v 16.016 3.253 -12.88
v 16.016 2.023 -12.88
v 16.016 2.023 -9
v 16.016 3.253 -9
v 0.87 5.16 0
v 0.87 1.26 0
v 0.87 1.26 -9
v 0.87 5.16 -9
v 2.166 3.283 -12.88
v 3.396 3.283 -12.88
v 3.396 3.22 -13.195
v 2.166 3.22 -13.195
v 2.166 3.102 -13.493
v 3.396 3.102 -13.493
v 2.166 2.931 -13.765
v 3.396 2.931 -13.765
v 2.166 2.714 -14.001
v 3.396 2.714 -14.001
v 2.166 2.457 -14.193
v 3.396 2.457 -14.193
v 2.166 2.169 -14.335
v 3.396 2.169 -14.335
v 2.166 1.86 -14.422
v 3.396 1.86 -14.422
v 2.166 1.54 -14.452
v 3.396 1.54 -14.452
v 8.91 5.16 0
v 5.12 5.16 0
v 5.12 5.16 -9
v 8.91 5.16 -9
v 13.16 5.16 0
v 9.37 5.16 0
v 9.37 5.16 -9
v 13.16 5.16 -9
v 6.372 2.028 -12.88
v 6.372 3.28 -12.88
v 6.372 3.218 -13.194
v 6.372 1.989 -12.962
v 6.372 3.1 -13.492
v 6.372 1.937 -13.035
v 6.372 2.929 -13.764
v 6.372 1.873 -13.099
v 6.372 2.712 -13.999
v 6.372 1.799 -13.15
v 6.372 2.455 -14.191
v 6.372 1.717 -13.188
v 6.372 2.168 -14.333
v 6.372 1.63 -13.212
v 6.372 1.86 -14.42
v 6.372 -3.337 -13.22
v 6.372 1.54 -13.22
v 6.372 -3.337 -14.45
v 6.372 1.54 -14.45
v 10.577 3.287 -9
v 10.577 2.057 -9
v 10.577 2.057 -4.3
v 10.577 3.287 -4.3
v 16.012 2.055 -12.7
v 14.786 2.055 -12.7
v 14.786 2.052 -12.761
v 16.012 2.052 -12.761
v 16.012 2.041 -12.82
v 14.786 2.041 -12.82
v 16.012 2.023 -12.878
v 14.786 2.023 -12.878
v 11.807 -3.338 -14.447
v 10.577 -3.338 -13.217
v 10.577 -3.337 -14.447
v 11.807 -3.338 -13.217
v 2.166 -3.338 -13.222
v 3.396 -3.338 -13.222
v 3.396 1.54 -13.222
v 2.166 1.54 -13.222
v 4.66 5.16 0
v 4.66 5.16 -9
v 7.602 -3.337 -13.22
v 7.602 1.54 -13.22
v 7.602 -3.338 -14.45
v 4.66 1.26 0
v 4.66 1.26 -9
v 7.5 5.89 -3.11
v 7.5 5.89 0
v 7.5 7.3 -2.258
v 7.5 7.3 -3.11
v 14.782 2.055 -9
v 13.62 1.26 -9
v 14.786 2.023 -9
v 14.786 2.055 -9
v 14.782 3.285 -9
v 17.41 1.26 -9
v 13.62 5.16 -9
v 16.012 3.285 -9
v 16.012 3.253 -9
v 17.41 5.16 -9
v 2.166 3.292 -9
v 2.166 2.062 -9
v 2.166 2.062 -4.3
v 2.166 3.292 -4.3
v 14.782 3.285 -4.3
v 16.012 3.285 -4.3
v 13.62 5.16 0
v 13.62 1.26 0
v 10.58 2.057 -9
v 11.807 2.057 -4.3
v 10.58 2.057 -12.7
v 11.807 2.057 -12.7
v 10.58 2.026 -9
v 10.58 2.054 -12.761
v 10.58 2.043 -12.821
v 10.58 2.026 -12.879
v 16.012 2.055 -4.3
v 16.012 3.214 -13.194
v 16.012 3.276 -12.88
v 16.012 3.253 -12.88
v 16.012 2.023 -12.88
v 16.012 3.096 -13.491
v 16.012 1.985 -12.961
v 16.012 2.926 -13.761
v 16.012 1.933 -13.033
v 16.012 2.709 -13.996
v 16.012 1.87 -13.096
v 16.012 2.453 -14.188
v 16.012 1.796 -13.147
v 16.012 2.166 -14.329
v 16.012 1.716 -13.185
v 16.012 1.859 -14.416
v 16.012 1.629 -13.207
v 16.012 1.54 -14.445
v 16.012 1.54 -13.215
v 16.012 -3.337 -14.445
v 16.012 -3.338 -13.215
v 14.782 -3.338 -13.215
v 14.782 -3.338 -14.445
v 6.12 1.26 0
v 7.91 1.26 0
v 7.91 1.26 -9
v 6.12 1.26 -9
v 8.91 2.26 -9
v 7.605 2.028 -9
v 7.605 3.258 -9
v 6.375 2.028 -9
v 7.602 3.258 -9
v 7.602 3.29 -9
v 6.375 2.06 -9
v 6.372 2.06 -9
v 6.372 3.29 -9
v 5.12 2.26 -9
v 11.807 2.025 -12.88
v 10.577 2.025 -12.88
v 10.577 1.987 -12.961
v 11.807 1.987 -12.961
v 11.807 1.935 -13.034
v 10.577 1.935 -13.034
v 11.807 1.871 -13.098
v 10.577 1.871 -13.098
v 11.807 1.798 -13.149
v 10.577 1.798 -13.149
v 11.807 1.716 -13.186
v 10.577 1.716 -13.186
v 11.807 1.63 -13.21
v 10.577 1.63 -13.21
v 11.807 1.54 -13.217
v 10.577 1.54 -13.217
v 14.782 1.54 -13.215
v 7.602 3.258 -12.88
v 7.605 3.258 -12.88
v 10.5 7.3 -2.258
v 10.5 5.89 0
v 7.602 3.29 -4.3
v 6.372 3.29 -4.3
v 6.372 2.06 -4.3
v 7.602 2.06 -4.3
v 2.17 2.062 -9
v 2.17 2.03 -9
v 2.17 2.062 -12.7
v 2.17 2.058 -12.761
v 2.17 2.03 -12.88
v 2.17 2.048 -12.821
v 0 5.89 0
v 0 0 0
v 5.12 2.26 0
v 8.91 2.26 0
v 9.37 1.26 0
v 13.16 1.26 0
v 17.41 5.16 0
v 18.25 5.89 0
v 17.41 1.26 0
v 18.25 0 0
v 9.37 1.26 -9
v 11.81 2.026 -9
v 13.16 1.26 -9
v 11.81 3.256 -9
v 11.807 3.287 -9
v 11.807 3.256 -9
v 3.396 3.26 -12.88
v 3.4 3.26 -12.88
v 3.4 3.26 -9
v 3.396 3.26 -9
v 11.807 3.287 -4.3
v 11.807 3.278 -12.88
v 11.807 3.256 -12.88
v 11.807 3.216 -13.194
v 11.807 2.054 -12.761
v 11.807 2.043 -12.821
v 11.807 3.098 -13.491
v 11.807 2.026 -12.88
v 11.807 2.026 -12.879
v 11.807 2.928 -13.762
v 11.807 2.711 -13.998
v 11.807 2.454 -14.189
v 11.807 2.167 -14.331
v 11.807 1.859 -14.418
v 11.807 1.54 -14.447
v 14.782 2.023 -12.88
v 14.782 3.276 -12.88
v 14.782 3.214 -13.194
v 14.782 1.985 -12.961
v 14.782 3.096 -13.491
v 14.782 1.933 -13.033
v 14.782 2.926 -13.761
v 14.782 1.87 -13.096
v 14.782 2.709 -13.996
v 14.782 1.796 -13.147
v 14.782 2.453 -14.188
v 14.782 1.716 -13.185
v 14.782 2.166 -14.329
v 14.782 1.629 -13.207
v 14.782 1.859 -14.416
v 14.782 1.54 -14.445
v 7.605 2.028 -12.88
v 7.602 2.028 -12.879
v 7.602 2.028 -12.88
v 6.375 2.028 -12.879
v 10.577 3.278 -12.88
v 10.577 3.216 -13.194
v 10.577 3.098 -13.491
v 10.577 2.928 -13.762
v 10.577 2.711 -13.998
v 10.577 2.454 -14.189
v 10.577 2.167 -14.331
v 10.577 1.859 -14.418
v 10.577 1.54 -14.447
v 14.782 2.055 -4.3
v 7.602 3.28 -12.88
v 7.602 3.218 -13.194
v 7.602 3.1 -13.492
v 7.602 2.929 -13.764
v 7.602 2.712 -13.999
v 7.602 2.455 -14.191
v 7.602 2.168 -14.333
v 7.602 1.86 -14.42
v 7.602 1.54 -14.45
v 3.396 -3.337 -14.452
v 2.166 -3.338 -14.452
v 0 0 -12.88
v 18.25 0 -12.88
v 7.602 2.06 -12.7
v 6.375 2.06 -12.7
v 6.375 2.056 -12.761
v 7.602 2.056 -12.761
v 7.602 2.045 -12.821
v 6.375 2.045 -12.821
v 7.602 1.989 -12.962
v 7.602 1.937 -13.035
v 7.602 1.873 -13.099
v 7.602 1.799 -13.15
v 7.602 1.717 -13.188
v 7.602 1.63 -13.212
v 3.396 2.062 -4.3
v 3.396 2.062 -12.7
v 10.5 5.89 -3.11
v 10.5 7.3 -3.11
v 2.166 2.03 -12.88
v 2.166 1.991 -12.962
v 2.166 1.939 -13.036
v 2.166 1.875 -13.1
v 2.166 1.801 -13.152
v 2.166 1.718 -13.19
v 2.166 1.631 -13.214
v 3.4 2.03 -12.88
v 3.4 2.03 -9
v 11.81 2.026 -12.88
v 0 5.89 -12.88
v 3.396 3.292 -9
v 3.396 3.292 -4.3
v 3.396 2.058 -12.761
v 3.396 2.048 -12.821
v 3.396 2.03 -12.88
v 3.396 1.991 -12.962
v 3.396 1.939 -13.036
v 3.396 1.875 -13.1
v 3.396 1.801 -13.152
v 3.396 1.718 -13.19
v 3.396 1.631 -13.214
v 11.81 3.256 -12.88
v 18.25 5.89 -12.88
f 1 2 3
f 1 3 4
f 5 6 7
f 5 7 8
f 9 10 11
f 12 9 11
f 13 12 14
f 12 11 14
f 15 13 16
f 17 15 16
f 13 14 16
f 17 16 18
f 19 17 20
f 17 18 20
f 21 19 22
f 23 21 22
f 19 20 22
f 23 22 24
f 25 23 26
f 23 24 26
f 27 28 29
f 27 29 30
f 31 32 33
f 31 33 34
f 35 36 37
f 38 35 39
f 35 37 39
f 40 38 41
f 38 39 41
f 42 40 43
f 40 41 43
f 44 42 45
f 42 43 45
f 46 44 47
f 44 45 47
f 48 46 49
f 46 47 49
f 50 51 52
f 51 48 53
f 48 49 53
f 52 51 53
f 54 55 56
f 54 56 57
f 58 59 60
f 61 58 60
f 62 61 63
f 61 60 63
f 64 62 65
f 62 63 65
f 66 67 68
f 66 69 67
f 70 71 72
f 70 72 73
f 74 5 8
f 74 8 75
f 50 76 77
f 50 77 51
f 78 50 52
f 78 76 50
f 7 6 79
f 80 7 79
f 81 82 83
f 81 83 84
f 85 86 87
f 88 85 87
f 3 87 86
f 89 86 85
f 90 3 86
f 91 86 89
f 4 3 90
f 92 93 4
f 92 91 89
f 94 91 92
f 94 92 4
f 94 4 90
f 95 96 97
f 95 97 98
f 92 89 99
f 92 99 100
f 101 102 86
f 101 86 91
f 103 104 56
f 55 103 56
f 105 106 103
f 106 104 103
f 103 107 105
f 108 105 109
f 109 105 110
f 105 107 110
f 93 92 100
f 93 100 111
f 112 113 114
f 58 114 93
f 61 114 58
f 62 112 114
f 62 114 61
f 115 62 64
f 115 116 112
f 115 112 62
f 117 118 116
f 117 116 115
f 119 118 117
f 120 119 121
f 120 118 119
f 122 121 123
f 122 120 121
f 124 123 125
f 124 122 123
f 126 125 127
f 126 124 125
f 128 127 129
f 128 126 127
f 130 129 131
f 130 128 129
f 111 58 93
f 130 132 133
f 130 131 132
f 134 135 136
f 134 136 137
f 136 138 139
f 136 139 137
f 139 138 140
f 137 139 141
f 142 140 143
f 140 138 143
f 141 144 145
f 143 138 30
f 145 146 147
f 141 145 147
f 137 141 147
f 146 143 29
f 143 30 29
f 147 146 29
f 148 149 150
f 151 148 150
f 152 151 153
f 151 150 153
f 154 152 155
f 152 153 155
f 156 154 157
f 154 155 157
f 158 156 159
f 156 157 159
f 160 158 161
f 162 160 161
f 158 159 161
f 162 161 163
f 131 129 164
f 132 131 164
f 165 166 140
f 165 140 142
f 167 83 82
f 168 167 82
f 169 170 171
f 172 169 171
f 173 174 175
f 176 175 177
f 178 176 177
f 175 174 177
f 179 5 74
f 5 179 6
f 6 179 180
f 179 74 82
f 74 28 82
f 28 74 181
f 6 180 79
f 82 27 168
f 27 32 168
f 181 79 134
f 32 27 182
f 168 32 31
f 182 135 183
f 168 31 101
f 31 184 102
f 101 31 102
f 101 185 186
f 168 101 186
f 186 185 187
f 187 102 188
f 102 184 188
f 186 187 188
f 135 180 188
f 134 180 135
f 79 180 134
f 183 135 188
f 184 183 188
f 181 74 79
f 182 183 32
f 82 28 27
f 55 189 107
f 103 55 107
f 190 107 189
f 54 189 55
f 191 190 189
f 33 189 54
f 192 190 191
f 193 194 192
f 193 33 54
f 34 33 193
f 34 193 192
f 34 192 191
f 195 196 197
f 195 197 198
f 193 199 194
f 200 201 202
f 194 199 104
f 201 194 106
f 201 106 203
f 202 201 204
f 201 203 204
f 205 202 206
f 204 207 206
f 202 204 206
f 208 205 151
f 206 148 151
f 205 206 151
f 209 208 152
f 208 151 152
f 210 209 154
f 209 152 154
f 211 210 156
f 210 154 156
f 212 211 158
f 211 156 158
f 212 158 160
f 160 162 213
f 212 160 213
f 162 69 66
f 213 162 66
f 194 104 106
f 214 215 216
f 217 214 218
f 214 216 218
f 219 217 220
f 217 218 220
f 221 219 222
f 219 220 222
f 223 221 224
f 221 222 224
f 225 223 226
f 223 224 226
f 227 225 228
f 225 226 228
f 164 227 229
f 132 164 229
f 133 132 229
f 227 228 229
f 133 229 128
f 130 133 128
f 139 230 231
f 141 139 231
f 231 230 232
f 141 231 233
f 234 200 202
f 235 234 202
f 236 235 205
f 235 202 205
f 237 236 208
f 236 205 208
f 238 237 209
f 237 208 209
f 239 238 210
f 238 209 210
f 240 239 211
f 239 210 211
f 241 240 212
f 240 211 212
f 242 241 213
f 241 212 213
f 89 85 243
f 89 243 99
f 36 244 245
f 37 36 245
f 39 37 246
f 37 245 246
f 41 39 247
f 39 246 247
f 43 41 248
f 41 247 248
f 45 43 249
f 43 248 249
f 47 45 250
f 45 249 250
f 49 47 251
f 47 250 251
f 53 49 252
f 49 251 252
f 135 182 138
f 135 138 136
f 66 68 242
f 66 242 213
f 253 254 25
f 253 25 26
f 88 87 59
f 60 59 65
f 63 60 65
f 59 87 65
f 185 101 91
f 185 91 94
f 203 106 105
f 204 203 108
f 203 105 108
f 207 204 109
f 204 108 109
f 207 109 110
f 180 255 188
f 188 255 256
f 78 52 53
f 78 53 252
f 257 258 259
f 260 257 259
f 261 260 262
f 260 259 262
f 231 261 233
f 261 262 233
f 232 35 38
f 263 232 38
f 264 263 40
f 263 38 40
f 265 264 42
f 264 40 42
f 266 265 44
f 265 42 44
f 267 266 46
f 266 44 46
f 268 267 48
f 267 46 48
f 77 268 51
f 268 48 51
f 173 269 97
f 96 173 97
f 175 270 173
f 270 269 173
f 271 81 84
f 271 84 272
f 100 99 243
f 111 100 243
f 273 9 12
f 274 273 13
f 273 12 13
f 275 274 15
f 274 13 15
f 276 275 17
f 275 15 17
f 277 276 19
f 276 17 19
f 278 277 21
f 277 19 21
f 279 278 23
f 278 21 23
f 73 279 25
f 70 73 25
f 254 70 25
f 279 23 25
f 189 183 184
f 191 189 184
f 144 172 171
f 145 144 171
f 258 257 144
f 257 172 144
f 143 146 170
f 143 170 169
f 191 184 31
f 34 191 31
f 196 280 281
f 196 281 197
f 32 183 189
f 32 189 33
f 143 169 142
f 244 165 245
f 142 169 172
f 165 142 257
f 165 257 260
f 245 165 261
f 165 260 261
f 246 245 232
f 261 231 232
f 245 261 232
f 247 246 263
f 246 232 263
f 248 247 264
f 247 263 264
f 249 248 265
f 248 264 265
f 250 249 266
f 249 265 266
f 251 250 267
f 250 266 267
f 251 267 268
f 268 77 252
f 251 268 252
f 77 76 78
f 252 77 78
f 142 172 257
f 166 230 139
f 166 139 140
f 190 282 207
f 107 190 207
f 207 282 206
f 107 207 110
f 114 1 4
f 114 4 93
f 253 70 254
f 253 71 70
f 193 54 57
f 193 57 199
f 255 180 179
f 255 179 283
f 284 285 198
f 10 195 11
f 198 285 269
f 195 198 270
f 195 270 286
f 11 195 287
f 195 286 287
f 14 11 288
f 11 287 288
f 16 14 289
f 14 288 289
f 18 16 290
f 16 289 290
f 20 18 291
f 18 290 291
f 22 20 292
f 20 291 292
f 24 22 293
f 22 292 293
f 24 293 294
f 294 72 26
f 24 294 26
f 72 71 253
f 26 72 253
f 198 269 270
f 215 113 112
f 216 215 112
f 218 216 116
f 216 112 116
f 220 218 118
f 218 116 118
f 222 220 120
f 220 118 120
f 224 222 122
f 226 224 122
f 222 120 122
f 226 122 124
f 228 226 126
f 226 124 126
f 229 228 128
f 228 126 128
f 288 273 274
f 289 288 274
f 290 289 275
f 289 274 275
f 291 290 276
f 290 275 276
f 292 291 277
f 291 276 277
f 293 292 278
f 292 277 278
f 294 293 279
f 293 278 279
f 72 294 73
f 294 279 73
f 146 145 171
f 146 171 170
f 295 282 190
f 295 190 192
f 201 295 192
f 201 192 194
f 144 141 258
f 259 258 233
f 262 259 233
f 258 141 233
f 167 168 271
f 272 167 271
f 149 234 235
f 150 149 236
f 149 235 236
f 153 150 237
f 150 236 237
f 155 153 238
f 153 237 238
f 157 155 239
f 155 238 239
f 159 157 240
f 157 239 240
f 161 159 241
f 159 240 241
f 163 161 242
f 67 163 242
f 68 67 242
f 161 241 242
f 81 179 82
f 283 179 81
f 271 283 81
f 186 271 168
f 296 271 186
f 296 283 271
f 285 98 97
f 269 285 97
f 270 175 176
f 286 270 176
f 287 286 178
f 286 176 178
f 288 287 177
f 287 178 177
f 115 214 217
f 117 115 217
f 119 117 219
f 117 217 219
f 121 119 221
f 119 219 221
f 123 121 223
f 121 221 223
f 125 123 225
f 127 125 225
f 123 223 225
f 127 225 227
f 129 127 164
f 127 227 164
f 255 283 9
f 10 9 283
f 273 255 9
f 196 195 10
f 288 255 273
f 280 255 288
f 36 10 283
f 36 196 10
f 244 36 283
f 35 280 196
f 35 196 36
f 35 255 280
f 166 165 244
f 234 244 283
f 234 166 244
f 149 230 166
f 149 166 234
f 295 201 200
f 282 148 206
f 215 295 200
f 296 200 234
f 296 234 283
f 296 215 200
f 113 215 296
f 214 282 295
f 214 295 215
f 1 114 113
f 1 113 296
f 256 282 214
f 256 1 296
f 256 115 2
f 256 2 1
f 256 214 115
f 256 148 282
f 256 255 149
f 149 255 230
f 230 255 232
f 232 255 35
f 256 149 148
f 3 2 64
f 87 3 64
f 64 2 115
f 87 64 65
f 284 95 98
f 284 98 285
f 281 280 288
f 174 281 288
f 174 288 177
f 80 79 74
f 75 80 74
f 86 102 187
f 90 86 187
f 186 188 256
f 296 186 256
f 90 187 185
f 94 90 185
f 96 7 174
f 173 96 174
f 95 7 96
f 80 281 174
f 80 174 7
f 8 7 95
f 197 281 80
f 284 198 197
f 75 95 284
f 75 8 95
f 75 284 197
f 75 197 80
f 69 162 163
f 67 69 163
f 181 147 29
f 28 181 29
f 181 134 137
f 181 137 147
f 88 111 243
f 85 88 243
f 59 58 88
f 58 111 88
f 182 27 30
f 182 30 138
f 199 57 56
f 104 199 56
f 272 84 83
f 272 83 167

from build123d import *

# Parameters (mm, degrees)
SKETCH1_W           = 18.25
SKETCH1_H           = 12.88
BOSS_EXTRUDE1_DEPTH = 5.89
SKETCH2_W           = 3.79
SKETCH2_H           = 3.9
CUT_EXTRUDE1_DEPTH  = 9
SKETCH3_W           = 3
SKETCH3_H           = 3.11
BOSS_EXTRUDE2_DEPTH = 1.41
CUT_EXTRUDE2_DEPTH  = 3
SKETCH5_W           = 1.23
SKETCH5_H           = 1.23
CUT_EXTRUDE3_DEPTH  = 4
SKETCH8_W           = 1.23
SKETCH8_H           = 1.23


with BuildPart() as part:
    # Sketch1 → Boss-Extrude1 (new body)
    with BuildSketch(Plane(origin=(0, 0, 0), x_dir=(1, 0, 0), z_dir=(0, 1, 0))):
        with Locations((9.125, 6.44)):
            Rectangle(SKETCH1_W, SKETCH1_H)
    extrude(amount=BOSS_EXTRUDE1_DEPTH)

    # Sketch2 → Cut-Extrude1 (cut)
    with BuildSketch(Plane.XY):
        with Locations((2.765, 3.21048567)):
            Rectangle(SKETCH2_W, SKETCH2_H)
        Polygon((5.12, 5.16048567), (8.91, 5.16048567), (8.91, 2.26048567), (7.91, 1.26048567), (6.12, 1.26048567), (5.12, 2.26048567), align=None)
        with Locations((11.265, 3.21048567)):
            Rectangle(SKETCH2_W, SKETCH2_H)
        with Locations((15.515, 3.21048567)):
            Rectangle(SKETCH2_W, SKETCH2_H)
    extrude(amount=-CUT_EXTRUDE1_DEPTH, mode=Mode.SUBTRACT)

    # Sketch3 → Boss-Extrude2 (add)
    with BuildSketch(Plane(origin=(0, 5.89, 0), x_dir=(1, 0, 0), z_dir=(0, 1, 0))):
        with Locations((9, 1.555)):
            Rectangle(SKETCH3_W, SKETCH3_H)
    extrude(amount=BOSS_EXTRUDE2_DEPTH)

    # Sketch4 → Cut-Extrude2 (cut)
    with BuildSketch(Plane.ZY.offset(-7.5)):
        Polygon((-2.258367839, 7.3), (0, 5.89), (0, 7.3), align=None)
    extrude(amount=-CUT_EXTRUDE2_DEPTH, mode=Mode.SUBTRACT)

    # Sketch5 → Cut-Extrude3 (cut)
    with BuildSketch(Plane(origin=(0, 0, -12.88), x_dir=(-1, 0, 0), z_dir=(0, 0, -1))):
        with Locations((-2.785, 2.645)):
            Rectangle(SKETCH5_W, SKETCH5_H)
        with Locations((-6.990239219, 2.642823938)):
            Rectangle(SKETCH5_W, SKETCH5_H)
        with Locations((-11.195478439, 2.640647876)):
            Rectangle(SKETCH5_W, SKETCH5_H)
        with Locations((-15.400717658, 2.638471814)):
            Rectangle(SKETCH5_W, SKETCH5_H)
    extrude(amount=-CUT_EXTRUDE3_DEPTH, mode=Mode.SUBTRACT)

    # Sweep2: sweep along a path in Sketch7
    with BuildLine(Plane.ZY) as sweep2_path:
        Line((-4.3, 2.72), (-12.700459496, 2.72))
        ThreePointArc((-12.700459496, 2.72), (-13.534520585, 2.374520585), (-13.88, 1.540459496))
        Line((-13.88, 1.540459496), (-13.88, -3.3375))
    # Sketch8 → Sweep2 (sweep)
    with BuildSketch(Plane.XZ.offset(3.3375)):
        with Locations((15.397064507, -13.830209109)):
            Rectangle(SKETCH8_W, SKETCH8_H)
        with Locations((11.191825288, -13.832385171)):
            Rectangle(SKETCH8_W, SKETCH8_H)
        with Locations((6.986586068, -13.834561233)):
            Rectangle(SKETCH8_W, SKETCH8_H)
        with Locations((2.781346849, -13.836737294)):
            Rectangle(SKETCH8_W, SKETCH8_H)
    sweep(path=sweep2_path.line)


solid = part.part
